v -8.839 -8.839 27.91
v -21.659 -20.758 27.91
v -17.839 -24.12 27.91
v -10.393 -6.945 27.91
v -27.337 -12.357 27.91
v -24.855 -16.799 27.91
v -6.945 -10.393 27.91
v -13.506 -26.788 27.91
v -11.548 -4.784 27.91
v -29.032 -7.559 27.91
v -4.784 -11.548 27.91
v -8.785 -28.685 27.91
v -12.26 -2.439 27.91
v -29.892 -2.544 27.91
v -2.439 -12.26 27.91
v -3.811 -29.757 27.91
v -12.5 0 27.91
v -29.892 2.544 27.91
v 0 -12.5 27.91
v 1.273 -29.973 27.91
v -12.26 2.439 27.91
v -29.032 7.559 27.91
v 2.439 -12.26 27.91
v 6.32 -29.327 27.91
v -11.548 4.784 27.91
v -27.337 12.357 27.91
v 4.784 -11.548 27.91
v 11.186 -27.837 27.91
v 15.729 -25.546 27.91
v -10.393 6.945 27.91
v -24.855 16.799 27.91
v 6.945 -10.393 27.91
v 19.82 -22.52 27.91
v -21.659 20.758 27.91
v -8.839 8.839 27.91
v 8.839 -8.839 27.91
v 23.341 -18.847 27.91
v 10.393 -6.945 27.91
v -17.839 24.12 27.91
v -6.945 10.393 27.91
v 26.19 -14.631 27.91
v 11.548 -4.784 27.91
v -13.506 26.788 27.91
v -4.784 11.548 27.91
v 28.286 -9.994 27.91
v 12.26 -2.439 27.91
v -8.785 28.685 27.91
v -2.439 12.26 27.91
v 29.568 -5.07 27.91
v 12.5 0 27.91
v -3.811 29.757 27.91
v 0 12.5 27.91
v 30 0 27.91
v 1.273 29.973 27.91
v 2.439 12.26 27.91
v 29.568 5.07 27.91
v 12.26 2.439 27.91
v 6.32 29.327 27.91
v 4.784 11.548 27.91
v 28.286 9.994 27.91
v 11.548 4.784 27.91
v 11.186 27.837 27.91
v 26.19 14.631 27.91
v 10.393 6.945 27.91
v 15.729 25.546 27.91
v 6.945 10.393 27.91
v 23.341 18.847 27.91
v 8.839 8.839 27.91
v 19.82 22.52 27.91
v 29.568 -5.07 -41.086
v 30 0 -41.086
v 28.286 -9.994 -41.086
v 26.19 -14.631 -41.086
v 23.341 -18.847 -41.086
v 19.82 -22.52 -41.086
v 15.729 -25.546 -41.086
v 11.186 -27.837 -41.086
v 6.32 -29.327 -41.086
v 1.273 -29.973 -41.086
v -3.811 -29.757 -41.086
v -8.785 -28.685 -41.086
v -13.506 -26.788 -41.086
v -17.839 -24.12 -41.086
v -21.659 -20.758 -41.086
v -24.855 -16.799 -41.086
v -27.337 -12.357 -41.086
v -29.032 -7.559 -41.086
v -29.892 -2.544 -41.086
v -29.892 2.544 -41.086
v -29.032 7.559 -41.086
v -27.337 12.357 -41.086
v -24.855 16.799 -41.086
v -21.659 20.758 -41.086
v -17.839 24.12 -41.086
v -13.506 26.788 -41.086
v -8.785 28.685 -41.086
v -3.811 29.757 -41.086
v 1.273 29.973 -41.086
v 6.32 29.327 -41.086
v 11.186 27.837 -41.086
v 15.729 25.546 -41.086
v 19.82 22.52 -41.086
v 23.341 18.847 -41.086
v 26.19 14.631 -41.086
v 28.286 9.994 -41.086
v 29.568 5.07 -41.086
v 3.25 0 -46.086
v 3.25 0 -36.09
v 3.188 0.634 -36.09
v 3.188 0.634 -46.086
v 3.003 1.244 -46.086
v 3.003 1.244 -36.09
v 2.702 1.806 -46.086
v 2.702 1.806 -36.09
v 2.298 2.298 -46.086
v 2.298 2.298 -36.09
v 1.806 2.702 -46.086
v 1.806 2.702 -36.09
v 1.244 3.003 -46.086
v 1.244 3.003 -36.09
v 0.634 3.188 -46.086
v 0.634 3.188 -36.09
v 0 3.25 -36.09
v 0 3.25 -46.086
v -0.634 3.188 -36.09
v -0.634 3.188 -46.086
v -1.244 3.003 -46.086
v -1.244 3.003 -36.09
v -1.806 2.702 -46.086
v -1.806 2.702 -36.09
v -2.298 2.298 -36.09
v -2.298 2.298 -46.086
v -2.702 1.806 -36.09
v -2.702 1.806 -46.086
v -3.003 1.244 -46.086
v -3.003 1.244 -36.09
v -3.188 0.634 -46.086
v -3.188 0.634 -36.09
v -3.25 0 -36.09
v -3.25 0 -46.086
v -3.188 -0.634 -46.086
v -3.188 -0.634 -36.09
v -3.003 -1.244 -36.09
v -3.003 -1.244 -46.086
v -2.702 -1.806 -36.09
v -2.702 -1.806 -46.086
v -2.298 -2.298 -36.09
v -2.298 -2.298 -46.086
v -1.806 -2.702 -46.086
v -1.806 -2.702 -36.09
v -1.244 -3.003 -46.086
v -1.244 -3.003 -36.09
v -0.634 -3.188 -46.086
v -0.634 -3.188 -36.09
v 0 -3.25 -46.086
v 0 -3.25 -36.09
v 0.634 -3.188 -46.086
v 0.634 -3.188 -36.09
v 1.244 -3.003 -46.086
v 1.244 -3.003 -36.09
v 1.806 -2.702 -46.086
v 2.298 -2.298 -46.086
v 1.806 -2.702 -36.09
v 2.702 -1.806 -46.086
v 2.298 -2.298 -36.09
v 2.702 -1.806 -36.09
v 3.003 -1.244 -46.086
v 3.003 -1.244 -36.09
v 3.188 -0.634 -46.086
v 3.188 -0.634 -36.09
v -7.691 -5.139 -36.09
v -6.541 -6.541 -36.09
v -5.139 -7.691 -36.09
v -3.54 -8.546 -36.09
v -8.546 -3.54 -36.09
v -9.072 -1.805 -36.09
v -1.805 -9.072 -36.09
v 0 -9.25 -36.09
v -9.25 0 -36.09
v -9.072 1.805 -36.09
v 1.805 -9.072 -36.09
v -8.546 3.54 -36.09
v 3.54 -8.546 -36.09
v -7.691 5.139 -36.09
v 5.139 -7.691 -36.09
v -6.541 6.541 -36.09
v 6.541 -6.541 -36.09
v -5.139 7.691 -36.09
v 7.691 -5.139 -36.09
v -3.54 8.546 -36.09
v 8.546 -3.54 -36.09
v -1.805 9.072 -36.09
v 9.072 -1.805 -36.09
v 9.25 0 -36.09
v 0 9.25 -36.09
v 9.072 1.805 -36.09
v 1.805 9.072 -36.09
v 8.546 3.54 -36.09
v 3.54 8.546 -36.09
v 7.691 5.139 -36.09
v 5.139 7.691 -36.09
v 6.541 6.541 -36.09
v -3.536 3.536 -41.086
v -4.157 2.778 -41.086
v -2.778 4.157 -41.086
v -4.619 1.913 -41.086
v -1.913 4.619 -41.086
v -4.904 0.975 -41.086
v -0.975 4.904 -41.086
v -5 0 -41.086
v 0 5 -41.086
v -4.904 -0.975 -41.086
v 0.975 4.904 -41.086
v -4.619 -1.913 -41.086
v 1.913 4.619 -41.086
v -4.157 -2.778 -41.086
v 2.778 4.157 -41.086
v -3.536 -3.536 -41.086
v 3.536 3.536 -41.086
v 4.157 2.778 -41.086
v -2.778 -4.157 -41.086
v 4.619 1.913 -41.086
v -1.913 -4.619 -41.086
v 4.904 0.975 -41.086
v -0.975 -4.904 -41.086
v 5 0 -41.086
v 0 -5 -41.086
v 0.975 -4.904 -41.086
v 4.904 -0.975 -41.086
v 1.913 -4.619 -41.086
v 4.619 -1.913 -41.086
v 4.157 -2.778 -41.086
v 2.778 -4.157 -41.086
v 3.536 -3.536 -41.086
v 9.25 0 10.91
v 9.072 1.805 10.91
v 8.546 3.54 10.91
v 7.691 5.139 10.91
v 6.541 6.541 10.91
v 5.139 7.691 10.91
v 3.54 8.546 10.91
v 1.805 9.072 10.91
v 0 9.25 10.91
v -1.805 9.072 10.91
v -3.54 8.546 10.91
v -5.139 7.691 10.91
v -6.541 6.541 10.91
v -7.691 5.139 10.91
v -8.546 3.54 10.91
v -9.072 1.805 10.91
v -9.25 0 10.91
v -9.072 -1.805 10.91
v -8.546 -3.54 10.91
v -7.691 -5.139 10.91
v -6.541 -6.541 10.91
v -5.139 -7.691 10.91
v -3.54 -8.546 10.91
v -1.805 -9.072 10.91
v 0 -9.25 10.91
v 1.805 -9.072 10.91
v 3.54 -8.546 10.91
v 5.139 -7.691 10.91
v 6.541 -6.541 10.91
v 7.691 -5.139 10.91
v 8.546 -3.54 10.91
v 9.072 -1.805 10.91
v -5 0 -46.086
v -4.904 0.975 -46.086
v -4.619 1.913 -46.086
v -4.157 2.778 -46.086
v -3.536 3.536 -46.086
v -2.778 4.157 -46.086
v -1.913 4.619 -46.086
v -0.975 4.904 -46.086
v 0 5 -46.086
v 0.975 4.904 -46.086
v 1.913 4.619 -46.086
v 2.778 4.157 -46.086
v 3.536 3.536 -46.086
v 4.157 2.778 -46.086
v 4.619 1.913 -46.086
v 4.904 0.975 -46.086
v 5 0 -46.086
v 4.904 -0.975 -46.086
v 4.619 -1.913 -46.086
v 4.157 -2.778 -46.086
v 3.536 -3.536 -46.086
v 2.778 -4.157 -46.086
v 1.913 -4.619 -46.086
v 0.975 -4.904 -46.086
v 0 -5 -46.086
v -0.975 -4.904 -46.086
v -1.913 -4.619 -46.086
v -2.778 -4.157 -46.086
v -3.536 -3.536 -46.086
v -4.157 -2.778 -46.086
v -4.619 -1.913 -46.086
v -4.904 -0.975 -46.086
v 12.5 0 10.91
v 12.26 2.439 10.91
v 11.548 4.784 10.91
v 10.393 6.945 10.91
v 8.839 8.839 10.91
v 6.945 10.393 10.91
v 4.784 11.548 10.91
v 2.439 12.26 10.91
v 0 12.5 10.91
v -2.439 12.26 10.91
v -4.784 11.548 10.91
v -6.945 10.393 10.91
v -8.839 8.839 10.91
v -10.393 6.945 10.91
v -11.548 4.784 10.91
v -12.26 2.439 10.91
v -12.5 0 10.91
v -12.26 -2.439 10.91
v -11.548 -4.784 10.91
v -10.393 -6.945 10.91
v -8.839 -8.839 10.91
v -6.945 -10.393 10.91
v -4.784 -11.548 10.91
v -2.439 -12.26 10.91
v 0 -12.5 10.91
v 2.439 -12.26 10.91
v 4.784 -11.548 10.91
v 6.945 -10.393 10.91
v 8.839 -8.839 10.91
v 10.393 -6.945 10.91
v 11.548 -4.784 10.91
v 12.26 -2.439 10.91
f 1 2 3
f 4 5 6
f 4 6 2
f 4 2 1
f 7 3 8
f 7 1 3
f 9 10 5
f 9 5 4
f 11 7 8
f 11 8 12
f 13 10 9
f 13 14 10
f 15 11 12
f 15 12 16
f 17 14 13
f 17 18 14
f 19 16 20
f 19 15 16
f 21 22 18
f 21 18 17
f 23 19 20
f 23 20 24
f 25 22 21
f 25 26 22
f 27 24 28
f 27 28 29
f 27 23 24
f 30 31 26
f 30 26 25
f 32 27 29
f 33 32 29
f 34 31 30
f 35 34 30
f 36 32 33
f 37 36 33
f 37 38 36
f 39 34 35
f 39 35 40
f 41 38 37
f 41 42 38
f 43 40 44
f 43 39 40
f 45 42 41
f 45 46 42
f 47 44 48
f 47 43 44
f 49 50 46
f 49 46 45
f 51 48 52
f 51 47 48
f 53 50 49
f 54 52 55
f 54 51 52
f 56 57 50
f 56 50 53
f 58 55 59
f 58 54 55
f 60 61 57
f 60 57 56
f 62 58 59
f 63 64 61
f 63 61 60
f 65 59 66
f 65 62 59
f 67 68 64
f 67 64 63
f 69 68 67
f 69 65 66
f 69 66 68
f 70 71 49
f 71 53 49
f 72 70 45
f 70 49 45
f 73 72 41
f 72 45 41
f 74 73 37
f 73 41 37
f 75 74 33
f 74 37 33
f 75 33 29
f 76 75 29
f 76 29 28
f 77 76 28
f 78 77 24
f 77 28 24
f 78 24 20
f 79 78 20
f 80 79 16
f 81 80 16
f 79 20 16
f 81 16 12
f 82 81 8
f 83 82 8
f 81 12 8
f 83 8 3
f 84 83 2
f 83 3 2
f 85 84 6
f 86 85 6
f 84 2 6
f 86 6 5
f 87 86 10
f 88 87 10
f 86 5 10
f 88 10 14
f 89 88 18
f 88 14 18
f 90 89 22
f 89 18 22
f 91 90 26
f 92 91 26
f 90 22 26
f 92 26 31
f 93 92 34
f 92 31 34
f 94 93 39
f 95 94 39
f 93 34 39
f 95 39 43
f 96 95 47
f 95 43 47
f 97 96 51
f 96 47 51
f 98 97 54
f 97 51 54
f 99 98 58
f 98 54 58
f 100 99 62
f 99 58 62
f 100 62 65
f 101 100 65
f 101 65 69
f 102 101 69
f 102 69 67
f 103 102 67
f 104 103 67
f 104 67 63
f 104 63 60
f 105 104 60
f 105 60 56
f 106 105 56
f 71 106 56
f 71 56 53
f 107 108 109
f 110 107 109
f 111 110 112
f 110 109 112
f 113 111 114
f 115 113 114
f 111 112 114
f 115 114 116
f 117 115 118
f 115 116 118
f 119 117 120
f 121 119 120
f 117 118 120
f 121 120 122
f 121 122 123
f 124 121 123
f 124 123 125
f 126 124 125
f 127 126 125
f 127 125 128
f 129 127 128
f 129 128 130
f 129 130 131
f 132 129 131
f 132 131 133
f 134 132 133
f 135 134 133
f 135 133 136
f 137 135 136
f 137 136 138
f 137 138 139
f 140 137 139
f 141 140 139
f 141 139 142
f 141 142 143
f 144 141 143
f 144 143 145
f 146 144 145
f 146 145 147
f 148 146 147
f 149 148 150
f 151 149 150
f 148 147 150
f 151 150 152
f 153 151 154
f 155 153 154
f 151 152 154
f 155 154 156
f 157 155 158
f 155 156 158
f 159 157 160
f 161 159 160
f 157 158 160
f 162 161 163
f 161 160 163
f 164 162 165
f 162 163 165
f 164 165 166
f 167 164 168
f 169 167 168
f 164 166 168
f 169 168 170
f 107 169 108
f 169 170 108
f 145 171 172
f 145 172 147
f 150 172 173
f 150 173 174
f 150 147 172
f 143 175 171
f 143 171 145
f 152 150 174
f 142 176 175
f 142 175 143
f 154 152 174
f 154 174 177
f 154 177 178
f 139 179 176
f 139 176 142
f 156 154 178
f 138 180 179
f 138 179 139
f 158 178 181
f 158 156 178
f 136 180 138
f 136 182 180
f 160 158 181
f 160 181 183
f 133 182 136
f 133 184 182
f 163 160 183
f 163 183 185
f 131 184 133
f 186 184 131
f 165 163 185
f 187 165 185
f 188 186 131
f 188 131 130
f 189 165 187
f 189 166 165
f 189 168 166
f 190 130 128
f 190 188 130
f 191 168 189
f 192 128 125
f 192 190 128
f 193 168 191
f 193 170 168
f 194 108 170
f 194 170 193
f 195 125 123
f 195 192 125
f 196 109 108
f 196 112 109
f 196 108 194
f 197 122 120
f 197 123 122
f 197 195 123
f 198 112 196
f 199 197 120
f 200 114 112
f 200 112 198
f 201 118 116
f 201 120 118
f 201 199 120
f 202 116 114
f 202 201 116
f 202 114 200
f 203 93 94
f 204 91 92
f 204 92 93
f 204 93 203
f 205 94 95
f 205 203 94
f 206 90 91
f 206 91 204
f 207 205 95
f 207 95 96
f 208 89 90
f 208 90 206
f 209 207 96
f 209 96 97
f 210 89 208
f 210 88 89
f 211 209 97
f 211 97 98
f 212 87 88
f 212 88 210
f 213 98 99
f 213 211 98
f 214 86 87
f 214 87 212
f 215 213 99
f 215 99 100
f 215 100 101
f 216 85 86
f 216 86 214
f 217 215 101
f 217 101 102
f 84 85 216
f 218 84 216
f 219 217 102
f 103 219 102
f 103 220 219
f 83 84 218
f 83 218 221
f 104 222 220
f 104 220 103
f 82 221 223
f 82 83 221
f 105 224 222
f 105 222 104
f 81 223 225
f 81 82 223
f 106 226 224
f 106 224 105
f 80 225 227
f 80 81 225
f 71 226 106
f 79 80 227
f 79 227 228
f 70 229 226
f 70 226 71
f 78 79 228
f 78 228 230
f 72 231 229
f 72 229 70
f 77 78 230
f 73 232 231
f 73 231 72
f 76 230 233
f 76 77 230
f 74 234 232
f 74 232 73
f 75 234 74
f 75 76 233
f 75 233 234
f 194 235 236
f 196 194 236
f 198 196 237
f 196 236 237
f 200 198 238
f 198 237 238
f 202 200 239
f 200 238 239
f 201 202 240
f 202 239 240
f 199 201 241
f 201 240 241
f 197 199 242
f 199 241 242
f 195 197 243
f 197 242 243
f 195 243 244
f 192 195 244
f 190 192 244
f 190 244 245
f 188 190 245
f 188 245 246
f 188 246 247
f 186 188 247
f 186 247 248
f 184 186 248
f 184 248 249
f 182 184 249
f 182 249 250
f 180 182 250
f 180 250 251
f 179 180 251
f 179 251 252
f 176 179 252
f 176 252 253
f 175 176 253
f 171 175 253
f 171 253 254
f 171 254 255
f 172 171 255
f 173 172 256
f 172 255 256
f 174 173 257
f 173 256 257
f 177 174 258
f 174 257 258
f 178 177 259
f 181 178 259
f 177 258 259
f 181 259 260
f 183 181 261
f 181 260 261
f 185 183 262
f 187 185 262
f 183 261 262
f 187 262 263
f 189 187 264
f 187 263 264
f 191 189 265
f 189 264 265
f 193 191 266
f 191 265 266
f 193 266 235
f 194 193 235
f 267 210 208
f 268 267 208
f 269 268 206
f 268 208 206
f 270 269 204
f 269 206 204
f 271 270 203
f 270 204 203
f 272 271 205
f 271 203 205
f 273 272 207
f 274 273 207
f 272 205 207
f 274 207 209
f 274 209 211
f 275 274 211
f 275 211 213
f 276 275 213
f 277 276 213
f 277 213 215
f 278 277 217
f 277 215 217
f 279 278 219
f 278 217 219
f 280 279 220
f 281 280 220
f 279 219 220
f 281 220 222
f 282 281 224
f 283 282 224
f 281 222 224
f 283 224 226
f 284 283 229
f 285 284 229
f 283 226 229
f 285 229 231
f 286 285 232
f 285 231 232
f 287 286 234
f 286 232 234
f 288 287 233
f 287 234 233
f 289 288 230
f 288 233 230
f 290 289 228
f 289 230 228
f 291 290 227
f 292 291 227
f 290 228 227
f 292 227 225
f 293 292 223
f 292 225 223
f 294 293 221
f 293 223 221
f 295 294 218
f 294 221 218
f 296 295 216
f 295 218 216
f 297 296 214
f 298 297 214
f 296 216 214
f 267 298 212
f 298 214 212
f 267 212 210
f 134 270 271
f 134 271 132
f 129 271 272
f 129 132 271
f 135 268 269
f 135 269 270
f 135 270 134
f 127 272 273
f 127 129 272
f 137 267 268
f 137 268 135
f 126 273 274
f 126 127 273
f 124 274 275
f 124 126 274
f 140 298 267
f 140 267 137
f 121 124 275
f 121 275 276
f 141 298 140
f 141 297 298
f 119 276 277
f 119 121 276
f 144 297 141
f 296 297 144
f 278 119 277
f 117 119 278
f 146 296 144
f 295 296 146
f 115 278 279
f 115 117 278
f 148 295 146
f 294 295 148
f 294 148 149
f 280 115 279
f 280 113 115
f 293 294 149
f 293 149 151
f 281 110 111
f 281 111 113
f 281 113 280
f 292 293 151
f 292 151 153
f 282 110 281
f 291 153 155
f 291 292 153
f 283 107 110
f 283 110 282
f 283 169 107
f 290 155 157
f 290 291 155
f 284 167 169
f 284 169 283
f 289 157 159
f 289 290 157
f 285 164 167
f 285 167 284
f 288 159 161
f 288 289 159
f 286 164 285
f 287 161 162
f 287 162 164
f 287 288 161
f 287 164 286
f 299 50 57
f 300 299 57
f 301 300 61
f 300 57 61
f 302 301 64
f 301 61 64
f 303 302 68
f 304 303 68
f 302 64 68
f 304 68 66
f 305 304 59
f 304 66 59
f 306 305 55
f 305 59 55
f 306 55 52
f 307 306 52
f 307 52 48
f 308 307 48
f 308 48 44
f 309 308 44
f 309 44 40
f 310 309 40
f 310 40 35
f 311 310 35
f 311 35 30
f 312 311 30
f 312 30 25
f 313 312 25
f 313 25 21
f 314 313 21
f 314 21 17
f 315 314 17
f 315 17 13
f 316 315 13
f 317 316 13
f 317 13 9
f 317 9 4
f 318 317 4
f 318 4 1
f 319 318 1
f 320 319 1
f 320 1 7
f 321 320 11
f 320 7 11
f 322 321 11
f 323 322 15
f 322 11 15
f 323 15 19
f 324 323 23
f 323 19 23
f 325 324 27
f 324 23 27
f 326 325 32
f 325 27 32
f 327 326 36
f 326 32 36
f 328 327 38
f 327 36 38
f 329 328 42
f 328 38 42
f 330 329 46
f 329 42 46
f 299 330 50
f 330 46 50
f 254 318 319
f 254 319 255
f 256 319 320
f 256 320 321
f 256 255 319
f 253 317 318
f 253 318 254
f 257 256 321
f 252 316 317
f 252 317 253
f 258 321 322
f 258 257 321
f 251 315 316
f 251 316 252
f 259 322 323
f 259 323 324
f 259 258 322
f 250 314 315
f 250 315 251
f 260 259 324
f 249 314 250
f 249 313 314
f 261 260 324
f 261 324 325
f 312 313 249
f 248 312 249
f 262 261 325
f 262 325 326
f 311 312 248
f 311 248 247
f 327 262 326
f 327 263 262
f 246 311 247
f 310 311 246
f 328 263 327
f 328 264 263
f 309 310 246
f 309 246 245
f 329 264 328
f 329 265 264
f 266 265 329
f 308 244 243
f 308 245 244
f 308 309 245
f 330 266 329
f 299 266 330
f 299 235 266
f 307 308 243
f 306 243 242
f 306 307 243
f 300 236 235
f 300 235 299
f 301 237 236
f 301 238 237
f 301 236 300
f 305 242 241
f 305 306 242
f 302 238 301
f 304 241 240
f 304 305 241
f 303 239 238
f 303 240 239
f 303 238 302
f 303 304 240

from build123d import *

# Parameters (mm, degrees)
SKETCH2_R            = 30
BOSS_EXTRUDE2_DEPTH  = 40.09
BOSS_EXTRUDE4_START  = 27.91
SKETCH4_R            = 30
BOSS_EXTRUDE4_DEPTH  = 27.91
SKETCH6_R            = 12.5
CUT_EXTRUDE1_DEPTH   = 19
SKETCH7_R            = 9.25
CUT_EXTRUDE2_DEPTH   = 65.815121692
CUT_EXTRUDE3_START   = -1
SKETCH8_R            = 30
SKETCH8_R_2          = 9.25
CUT_EXTRUDE3_DEPTH   = 1
CUT_EXTRUDE4_START   = -1.21
SKETCH9_R            = 30
SKETCH9_R_2          = 9.25
CUT_EXTRUDE4_DEPTH   = 1.21
SKETCH10_R           = 30
BOSS_EXTRUDE5_DEPTH  = 1
BOSS_EXTRUDE6_START  = 2
SKETCH11_R           = 9.25
BOSS_EXTRUDE6_DEPTH  = 2
SKETCH12_R           = 6.5
BOSS_EXTRUDE7_DEPTH  = 7.205952714
CUT_EXTRUDE5_START   = -5
SKETCH14_R           = 6.5
SKETCH14_R_2         = 5
CUT_EXTRUDE5_DEPTH   = 5
SKETCH15_R           = 3.25
CUT_EXTRUDE6_DEPTH   = 77.610469911
SKETCH16_R           = 30
SKETCH16_R_2         = 6.5
BOSS_EXTRUDE8_DEPTH  = 0.21
SKETCH17_R           = 30
SKETCH17_R_2         = 6.5
BOSS_EXTRUDE9_DEPTH  = 1.995952714
BOSS_EXTRUDE10_START = 0.79
SKETCH18_R           = 9.25
SKETCH18_R_2         = 3.25
BOSS_EXTRUDE10_DEPTH = 0.79
SKETCH19_R           = 9.25
SKETCH19_R_2         = 3.25
CUT_EXTRUDE7_DEPTH   = 1
BOSS_EXTRUDE11_START = 2
SKETCH21_R           = 12.5
SKETCH21_R_2         = 9.25
BOSS_EXTRUDE11_DEPTH = 2


with BuildPart() as part:
    # Sketch2 → Boss-Extrude2 (new body)
    with BuildSketch(Plane.XY):
        Circle(SKETCH2_R)
    extrude(amount=-BOSS_EXTRUDE2_DEPTH)

    # Sketch4 → Boss-Extrude4 (add)
    with BuildSketch(Plane.XY.offset(BOSS_EXTRUDE4_START)):
        Circle(SKETCH4_R)
    extrude(amount=-BOSS_EXTRUDE4_DEPTH)

    # Sketch6 → Cut-Extrude1 (cut)
    with BuildSketch(Plane.XY.offset(27.91)):
        Circle(SKETCH6_R)
    extrude(amount=-CUT_EXTRUDE1_DEPTH, mode=Mode.SUBTRACT)

    # Sketch7 → Cut-Extrude2 (cut, through all)
    with BuildSketch(Plane.XY.offset(8.91)):
        Circle(SKETCH7_R)
    extrude(amount=-CUT_EXTRUDE2_DEPTH, mode=Mode.SUBTRACT)

    # Sketch8 → Cut-Extrude3 (cut)
    with BuildSketch(Plane(origin=(0, 0, -40.09), x_dir=(-1, 0, 0), z_dir=(0, 0, -1)).offset(CUT_EXTRUDE3_START)):
        with Locations(Location((0, 0, 0), (0, 0, 180))):
            Circle(SKETCH8_R)
        with Locations(Location((0, 0, 0), (0, 0, 180))):
            Circle(SKETCH8_R_2, mode=Mode.SUBTRACT)
    extrude(amount=CUT_EXTRUDE3_DEPTH, mode=Mode.SUBTRACT)

    # Sketch9 → Cut-Extrude4 (cut)
    with BuildSketch(Plane(origin=(0, 0, -39.09), x_dir=(-1, 0, 0), z_dir=(0, 0, -1)).offset(CUT_EXTRUDE4_START)):
        with Locations(Location((0, 0, 0), (0, 0, 180))):
            Circle(SKETCH9_R)
        with Locations(Location((0, 0, 0), (0, 0, 180))):
            Circle(SKETCH9_R_2, mode=Mode.SUBTRACT)
    extrude(amount=CUT_EXTRUDE4_DEPTH, mode=Mode.SUBTRACT)

    # Sketch10 → Boss-Extrude5 (add)
    with BuildSketch(Plane(origin=(0, 0, -37.88), x_dir=(-1, 0, 0), z_dir=(0, 0, -1))):
        with Locations(Location((0, 0, 0), (0, 0, 180))):
            Circle(SKETCH10_R)
    extrude(amount=BOSS_EXTRUDE5_DEPTH)

    # Sketch11 → Boss-Extrude6 (add)
    with BuildSketch(Plane.XY.offset(-37.88).offset(BOSS_EXTRUDE6_START)):
        Circle(SKETCH11_R)
    extrude(amount=-BOSS_EXTRUDE6_DEPTH)

    # Sketch12 → Boss-Extrude7 (add)
    with BuildSketch(Plane(origin=(0, 0, -38.88), x_dir=(-1, 0, 0), z_dir=(0, 0, -1))):
        with Locations(Location((0, 0, 0), (0, 0, 180))):
            Circle(SKETCH12_R)
    extrude(amount=BOSS_EXTRUDE7_DEPTH)

    # Sketch14 → Cut-Extrude5 (cut)
    with BuildSketch(Plane(origin=(0, 0, -46.085952714), x_dir=(-1, 0, 0), z_dir=(0, 0, -1)).offset(CUT_EXTRUDE5_START)):
        Circle(SKETCH14_R)
        Circle(SKETCH14_R_2, mode=Mode.SUBTRACT)
    extrude(amount=CUT_EXTRUDE5_DEPTH, mode=Mode.SUBTRACT)

    # Sketch15 → Cut-Extrude6 (cut, through all)
    with BuildSketch(Plane.XY.offset(-35.88)):
        Circle(SKETCH15_R)
    extrude(amount=-CUT_EXTRUDE6_DEPTH, mode=Mode.SUBTRACT)

    # Sketch16 → Boss-Extrude8 (add)
    with BuildSketch(Plane(origin=(0, 0, -38.88), x_dir=(-1, 0, 0), z_dir=(0, 0, -1))):
        with Locations(Location((0, 0, 0), (0, 0, 180))):
            Circle(SKETCH16_R)
        Circle(SKETCH16_R_2, mode=Mode.SUBTRACT)
    extrude(amount=BOSS_EXTRUDE8_DEPTH)

    # Sketch17 → Boss-Extrude9 (add)
    with BuildSketch(Plane(origin=(0, 0, -39.09), x_dir=(-1, 0, 0), z_dir=(0, 0, -1))):
        with Locations(Location((0, 0, 0), (0, 0, 180))):
            Circle(SKETCH17_R)
        Circle(SKETCH17_R_2, mode=Mode.SUBTRACT)
    extrude(amount=BOSS_EXTRUDE9_DEPTH)

    # Sketch18 → Boss-Extrude10 (add)
    with BuildSketch(Plane.XY.offset(-35.88).offset(BOSS_EXTRUDE10_START)):
        Circle(SKETCH18_R)
        Circle(SKETCH18_R_2, mode=Mode.SUBTRACT)
    extrude(amount=-BOSS_EXTRUDE10_DEPTH)

    # Sketch19 → Cut-Extrude7 (cut)
    with BuildSketch(Plane.XY.offset(-35.09)):
        Circle(SKETCH19_R)
        Circle(SKETCH19_R_2, mode=Mode.SUBTRACT)
    extrude(amount=-CUT_EXTRUDE7_DEPTH, mode=Mode.SUBTRACT)

    # Sketch21 → Boss-Extrude11 (add)
    with BuildSketch(Plane.XY.offset(8.91).offset(BOSS_EXTRUDE11_START)):
        Circle(SKETCH21_R)
        Circle(SKETCH21_R_2, mode=Mode.SUBTRACT)
    extrude(amount=-BOSS_EXTRUDE11_DEPTH)


solid = part.part
